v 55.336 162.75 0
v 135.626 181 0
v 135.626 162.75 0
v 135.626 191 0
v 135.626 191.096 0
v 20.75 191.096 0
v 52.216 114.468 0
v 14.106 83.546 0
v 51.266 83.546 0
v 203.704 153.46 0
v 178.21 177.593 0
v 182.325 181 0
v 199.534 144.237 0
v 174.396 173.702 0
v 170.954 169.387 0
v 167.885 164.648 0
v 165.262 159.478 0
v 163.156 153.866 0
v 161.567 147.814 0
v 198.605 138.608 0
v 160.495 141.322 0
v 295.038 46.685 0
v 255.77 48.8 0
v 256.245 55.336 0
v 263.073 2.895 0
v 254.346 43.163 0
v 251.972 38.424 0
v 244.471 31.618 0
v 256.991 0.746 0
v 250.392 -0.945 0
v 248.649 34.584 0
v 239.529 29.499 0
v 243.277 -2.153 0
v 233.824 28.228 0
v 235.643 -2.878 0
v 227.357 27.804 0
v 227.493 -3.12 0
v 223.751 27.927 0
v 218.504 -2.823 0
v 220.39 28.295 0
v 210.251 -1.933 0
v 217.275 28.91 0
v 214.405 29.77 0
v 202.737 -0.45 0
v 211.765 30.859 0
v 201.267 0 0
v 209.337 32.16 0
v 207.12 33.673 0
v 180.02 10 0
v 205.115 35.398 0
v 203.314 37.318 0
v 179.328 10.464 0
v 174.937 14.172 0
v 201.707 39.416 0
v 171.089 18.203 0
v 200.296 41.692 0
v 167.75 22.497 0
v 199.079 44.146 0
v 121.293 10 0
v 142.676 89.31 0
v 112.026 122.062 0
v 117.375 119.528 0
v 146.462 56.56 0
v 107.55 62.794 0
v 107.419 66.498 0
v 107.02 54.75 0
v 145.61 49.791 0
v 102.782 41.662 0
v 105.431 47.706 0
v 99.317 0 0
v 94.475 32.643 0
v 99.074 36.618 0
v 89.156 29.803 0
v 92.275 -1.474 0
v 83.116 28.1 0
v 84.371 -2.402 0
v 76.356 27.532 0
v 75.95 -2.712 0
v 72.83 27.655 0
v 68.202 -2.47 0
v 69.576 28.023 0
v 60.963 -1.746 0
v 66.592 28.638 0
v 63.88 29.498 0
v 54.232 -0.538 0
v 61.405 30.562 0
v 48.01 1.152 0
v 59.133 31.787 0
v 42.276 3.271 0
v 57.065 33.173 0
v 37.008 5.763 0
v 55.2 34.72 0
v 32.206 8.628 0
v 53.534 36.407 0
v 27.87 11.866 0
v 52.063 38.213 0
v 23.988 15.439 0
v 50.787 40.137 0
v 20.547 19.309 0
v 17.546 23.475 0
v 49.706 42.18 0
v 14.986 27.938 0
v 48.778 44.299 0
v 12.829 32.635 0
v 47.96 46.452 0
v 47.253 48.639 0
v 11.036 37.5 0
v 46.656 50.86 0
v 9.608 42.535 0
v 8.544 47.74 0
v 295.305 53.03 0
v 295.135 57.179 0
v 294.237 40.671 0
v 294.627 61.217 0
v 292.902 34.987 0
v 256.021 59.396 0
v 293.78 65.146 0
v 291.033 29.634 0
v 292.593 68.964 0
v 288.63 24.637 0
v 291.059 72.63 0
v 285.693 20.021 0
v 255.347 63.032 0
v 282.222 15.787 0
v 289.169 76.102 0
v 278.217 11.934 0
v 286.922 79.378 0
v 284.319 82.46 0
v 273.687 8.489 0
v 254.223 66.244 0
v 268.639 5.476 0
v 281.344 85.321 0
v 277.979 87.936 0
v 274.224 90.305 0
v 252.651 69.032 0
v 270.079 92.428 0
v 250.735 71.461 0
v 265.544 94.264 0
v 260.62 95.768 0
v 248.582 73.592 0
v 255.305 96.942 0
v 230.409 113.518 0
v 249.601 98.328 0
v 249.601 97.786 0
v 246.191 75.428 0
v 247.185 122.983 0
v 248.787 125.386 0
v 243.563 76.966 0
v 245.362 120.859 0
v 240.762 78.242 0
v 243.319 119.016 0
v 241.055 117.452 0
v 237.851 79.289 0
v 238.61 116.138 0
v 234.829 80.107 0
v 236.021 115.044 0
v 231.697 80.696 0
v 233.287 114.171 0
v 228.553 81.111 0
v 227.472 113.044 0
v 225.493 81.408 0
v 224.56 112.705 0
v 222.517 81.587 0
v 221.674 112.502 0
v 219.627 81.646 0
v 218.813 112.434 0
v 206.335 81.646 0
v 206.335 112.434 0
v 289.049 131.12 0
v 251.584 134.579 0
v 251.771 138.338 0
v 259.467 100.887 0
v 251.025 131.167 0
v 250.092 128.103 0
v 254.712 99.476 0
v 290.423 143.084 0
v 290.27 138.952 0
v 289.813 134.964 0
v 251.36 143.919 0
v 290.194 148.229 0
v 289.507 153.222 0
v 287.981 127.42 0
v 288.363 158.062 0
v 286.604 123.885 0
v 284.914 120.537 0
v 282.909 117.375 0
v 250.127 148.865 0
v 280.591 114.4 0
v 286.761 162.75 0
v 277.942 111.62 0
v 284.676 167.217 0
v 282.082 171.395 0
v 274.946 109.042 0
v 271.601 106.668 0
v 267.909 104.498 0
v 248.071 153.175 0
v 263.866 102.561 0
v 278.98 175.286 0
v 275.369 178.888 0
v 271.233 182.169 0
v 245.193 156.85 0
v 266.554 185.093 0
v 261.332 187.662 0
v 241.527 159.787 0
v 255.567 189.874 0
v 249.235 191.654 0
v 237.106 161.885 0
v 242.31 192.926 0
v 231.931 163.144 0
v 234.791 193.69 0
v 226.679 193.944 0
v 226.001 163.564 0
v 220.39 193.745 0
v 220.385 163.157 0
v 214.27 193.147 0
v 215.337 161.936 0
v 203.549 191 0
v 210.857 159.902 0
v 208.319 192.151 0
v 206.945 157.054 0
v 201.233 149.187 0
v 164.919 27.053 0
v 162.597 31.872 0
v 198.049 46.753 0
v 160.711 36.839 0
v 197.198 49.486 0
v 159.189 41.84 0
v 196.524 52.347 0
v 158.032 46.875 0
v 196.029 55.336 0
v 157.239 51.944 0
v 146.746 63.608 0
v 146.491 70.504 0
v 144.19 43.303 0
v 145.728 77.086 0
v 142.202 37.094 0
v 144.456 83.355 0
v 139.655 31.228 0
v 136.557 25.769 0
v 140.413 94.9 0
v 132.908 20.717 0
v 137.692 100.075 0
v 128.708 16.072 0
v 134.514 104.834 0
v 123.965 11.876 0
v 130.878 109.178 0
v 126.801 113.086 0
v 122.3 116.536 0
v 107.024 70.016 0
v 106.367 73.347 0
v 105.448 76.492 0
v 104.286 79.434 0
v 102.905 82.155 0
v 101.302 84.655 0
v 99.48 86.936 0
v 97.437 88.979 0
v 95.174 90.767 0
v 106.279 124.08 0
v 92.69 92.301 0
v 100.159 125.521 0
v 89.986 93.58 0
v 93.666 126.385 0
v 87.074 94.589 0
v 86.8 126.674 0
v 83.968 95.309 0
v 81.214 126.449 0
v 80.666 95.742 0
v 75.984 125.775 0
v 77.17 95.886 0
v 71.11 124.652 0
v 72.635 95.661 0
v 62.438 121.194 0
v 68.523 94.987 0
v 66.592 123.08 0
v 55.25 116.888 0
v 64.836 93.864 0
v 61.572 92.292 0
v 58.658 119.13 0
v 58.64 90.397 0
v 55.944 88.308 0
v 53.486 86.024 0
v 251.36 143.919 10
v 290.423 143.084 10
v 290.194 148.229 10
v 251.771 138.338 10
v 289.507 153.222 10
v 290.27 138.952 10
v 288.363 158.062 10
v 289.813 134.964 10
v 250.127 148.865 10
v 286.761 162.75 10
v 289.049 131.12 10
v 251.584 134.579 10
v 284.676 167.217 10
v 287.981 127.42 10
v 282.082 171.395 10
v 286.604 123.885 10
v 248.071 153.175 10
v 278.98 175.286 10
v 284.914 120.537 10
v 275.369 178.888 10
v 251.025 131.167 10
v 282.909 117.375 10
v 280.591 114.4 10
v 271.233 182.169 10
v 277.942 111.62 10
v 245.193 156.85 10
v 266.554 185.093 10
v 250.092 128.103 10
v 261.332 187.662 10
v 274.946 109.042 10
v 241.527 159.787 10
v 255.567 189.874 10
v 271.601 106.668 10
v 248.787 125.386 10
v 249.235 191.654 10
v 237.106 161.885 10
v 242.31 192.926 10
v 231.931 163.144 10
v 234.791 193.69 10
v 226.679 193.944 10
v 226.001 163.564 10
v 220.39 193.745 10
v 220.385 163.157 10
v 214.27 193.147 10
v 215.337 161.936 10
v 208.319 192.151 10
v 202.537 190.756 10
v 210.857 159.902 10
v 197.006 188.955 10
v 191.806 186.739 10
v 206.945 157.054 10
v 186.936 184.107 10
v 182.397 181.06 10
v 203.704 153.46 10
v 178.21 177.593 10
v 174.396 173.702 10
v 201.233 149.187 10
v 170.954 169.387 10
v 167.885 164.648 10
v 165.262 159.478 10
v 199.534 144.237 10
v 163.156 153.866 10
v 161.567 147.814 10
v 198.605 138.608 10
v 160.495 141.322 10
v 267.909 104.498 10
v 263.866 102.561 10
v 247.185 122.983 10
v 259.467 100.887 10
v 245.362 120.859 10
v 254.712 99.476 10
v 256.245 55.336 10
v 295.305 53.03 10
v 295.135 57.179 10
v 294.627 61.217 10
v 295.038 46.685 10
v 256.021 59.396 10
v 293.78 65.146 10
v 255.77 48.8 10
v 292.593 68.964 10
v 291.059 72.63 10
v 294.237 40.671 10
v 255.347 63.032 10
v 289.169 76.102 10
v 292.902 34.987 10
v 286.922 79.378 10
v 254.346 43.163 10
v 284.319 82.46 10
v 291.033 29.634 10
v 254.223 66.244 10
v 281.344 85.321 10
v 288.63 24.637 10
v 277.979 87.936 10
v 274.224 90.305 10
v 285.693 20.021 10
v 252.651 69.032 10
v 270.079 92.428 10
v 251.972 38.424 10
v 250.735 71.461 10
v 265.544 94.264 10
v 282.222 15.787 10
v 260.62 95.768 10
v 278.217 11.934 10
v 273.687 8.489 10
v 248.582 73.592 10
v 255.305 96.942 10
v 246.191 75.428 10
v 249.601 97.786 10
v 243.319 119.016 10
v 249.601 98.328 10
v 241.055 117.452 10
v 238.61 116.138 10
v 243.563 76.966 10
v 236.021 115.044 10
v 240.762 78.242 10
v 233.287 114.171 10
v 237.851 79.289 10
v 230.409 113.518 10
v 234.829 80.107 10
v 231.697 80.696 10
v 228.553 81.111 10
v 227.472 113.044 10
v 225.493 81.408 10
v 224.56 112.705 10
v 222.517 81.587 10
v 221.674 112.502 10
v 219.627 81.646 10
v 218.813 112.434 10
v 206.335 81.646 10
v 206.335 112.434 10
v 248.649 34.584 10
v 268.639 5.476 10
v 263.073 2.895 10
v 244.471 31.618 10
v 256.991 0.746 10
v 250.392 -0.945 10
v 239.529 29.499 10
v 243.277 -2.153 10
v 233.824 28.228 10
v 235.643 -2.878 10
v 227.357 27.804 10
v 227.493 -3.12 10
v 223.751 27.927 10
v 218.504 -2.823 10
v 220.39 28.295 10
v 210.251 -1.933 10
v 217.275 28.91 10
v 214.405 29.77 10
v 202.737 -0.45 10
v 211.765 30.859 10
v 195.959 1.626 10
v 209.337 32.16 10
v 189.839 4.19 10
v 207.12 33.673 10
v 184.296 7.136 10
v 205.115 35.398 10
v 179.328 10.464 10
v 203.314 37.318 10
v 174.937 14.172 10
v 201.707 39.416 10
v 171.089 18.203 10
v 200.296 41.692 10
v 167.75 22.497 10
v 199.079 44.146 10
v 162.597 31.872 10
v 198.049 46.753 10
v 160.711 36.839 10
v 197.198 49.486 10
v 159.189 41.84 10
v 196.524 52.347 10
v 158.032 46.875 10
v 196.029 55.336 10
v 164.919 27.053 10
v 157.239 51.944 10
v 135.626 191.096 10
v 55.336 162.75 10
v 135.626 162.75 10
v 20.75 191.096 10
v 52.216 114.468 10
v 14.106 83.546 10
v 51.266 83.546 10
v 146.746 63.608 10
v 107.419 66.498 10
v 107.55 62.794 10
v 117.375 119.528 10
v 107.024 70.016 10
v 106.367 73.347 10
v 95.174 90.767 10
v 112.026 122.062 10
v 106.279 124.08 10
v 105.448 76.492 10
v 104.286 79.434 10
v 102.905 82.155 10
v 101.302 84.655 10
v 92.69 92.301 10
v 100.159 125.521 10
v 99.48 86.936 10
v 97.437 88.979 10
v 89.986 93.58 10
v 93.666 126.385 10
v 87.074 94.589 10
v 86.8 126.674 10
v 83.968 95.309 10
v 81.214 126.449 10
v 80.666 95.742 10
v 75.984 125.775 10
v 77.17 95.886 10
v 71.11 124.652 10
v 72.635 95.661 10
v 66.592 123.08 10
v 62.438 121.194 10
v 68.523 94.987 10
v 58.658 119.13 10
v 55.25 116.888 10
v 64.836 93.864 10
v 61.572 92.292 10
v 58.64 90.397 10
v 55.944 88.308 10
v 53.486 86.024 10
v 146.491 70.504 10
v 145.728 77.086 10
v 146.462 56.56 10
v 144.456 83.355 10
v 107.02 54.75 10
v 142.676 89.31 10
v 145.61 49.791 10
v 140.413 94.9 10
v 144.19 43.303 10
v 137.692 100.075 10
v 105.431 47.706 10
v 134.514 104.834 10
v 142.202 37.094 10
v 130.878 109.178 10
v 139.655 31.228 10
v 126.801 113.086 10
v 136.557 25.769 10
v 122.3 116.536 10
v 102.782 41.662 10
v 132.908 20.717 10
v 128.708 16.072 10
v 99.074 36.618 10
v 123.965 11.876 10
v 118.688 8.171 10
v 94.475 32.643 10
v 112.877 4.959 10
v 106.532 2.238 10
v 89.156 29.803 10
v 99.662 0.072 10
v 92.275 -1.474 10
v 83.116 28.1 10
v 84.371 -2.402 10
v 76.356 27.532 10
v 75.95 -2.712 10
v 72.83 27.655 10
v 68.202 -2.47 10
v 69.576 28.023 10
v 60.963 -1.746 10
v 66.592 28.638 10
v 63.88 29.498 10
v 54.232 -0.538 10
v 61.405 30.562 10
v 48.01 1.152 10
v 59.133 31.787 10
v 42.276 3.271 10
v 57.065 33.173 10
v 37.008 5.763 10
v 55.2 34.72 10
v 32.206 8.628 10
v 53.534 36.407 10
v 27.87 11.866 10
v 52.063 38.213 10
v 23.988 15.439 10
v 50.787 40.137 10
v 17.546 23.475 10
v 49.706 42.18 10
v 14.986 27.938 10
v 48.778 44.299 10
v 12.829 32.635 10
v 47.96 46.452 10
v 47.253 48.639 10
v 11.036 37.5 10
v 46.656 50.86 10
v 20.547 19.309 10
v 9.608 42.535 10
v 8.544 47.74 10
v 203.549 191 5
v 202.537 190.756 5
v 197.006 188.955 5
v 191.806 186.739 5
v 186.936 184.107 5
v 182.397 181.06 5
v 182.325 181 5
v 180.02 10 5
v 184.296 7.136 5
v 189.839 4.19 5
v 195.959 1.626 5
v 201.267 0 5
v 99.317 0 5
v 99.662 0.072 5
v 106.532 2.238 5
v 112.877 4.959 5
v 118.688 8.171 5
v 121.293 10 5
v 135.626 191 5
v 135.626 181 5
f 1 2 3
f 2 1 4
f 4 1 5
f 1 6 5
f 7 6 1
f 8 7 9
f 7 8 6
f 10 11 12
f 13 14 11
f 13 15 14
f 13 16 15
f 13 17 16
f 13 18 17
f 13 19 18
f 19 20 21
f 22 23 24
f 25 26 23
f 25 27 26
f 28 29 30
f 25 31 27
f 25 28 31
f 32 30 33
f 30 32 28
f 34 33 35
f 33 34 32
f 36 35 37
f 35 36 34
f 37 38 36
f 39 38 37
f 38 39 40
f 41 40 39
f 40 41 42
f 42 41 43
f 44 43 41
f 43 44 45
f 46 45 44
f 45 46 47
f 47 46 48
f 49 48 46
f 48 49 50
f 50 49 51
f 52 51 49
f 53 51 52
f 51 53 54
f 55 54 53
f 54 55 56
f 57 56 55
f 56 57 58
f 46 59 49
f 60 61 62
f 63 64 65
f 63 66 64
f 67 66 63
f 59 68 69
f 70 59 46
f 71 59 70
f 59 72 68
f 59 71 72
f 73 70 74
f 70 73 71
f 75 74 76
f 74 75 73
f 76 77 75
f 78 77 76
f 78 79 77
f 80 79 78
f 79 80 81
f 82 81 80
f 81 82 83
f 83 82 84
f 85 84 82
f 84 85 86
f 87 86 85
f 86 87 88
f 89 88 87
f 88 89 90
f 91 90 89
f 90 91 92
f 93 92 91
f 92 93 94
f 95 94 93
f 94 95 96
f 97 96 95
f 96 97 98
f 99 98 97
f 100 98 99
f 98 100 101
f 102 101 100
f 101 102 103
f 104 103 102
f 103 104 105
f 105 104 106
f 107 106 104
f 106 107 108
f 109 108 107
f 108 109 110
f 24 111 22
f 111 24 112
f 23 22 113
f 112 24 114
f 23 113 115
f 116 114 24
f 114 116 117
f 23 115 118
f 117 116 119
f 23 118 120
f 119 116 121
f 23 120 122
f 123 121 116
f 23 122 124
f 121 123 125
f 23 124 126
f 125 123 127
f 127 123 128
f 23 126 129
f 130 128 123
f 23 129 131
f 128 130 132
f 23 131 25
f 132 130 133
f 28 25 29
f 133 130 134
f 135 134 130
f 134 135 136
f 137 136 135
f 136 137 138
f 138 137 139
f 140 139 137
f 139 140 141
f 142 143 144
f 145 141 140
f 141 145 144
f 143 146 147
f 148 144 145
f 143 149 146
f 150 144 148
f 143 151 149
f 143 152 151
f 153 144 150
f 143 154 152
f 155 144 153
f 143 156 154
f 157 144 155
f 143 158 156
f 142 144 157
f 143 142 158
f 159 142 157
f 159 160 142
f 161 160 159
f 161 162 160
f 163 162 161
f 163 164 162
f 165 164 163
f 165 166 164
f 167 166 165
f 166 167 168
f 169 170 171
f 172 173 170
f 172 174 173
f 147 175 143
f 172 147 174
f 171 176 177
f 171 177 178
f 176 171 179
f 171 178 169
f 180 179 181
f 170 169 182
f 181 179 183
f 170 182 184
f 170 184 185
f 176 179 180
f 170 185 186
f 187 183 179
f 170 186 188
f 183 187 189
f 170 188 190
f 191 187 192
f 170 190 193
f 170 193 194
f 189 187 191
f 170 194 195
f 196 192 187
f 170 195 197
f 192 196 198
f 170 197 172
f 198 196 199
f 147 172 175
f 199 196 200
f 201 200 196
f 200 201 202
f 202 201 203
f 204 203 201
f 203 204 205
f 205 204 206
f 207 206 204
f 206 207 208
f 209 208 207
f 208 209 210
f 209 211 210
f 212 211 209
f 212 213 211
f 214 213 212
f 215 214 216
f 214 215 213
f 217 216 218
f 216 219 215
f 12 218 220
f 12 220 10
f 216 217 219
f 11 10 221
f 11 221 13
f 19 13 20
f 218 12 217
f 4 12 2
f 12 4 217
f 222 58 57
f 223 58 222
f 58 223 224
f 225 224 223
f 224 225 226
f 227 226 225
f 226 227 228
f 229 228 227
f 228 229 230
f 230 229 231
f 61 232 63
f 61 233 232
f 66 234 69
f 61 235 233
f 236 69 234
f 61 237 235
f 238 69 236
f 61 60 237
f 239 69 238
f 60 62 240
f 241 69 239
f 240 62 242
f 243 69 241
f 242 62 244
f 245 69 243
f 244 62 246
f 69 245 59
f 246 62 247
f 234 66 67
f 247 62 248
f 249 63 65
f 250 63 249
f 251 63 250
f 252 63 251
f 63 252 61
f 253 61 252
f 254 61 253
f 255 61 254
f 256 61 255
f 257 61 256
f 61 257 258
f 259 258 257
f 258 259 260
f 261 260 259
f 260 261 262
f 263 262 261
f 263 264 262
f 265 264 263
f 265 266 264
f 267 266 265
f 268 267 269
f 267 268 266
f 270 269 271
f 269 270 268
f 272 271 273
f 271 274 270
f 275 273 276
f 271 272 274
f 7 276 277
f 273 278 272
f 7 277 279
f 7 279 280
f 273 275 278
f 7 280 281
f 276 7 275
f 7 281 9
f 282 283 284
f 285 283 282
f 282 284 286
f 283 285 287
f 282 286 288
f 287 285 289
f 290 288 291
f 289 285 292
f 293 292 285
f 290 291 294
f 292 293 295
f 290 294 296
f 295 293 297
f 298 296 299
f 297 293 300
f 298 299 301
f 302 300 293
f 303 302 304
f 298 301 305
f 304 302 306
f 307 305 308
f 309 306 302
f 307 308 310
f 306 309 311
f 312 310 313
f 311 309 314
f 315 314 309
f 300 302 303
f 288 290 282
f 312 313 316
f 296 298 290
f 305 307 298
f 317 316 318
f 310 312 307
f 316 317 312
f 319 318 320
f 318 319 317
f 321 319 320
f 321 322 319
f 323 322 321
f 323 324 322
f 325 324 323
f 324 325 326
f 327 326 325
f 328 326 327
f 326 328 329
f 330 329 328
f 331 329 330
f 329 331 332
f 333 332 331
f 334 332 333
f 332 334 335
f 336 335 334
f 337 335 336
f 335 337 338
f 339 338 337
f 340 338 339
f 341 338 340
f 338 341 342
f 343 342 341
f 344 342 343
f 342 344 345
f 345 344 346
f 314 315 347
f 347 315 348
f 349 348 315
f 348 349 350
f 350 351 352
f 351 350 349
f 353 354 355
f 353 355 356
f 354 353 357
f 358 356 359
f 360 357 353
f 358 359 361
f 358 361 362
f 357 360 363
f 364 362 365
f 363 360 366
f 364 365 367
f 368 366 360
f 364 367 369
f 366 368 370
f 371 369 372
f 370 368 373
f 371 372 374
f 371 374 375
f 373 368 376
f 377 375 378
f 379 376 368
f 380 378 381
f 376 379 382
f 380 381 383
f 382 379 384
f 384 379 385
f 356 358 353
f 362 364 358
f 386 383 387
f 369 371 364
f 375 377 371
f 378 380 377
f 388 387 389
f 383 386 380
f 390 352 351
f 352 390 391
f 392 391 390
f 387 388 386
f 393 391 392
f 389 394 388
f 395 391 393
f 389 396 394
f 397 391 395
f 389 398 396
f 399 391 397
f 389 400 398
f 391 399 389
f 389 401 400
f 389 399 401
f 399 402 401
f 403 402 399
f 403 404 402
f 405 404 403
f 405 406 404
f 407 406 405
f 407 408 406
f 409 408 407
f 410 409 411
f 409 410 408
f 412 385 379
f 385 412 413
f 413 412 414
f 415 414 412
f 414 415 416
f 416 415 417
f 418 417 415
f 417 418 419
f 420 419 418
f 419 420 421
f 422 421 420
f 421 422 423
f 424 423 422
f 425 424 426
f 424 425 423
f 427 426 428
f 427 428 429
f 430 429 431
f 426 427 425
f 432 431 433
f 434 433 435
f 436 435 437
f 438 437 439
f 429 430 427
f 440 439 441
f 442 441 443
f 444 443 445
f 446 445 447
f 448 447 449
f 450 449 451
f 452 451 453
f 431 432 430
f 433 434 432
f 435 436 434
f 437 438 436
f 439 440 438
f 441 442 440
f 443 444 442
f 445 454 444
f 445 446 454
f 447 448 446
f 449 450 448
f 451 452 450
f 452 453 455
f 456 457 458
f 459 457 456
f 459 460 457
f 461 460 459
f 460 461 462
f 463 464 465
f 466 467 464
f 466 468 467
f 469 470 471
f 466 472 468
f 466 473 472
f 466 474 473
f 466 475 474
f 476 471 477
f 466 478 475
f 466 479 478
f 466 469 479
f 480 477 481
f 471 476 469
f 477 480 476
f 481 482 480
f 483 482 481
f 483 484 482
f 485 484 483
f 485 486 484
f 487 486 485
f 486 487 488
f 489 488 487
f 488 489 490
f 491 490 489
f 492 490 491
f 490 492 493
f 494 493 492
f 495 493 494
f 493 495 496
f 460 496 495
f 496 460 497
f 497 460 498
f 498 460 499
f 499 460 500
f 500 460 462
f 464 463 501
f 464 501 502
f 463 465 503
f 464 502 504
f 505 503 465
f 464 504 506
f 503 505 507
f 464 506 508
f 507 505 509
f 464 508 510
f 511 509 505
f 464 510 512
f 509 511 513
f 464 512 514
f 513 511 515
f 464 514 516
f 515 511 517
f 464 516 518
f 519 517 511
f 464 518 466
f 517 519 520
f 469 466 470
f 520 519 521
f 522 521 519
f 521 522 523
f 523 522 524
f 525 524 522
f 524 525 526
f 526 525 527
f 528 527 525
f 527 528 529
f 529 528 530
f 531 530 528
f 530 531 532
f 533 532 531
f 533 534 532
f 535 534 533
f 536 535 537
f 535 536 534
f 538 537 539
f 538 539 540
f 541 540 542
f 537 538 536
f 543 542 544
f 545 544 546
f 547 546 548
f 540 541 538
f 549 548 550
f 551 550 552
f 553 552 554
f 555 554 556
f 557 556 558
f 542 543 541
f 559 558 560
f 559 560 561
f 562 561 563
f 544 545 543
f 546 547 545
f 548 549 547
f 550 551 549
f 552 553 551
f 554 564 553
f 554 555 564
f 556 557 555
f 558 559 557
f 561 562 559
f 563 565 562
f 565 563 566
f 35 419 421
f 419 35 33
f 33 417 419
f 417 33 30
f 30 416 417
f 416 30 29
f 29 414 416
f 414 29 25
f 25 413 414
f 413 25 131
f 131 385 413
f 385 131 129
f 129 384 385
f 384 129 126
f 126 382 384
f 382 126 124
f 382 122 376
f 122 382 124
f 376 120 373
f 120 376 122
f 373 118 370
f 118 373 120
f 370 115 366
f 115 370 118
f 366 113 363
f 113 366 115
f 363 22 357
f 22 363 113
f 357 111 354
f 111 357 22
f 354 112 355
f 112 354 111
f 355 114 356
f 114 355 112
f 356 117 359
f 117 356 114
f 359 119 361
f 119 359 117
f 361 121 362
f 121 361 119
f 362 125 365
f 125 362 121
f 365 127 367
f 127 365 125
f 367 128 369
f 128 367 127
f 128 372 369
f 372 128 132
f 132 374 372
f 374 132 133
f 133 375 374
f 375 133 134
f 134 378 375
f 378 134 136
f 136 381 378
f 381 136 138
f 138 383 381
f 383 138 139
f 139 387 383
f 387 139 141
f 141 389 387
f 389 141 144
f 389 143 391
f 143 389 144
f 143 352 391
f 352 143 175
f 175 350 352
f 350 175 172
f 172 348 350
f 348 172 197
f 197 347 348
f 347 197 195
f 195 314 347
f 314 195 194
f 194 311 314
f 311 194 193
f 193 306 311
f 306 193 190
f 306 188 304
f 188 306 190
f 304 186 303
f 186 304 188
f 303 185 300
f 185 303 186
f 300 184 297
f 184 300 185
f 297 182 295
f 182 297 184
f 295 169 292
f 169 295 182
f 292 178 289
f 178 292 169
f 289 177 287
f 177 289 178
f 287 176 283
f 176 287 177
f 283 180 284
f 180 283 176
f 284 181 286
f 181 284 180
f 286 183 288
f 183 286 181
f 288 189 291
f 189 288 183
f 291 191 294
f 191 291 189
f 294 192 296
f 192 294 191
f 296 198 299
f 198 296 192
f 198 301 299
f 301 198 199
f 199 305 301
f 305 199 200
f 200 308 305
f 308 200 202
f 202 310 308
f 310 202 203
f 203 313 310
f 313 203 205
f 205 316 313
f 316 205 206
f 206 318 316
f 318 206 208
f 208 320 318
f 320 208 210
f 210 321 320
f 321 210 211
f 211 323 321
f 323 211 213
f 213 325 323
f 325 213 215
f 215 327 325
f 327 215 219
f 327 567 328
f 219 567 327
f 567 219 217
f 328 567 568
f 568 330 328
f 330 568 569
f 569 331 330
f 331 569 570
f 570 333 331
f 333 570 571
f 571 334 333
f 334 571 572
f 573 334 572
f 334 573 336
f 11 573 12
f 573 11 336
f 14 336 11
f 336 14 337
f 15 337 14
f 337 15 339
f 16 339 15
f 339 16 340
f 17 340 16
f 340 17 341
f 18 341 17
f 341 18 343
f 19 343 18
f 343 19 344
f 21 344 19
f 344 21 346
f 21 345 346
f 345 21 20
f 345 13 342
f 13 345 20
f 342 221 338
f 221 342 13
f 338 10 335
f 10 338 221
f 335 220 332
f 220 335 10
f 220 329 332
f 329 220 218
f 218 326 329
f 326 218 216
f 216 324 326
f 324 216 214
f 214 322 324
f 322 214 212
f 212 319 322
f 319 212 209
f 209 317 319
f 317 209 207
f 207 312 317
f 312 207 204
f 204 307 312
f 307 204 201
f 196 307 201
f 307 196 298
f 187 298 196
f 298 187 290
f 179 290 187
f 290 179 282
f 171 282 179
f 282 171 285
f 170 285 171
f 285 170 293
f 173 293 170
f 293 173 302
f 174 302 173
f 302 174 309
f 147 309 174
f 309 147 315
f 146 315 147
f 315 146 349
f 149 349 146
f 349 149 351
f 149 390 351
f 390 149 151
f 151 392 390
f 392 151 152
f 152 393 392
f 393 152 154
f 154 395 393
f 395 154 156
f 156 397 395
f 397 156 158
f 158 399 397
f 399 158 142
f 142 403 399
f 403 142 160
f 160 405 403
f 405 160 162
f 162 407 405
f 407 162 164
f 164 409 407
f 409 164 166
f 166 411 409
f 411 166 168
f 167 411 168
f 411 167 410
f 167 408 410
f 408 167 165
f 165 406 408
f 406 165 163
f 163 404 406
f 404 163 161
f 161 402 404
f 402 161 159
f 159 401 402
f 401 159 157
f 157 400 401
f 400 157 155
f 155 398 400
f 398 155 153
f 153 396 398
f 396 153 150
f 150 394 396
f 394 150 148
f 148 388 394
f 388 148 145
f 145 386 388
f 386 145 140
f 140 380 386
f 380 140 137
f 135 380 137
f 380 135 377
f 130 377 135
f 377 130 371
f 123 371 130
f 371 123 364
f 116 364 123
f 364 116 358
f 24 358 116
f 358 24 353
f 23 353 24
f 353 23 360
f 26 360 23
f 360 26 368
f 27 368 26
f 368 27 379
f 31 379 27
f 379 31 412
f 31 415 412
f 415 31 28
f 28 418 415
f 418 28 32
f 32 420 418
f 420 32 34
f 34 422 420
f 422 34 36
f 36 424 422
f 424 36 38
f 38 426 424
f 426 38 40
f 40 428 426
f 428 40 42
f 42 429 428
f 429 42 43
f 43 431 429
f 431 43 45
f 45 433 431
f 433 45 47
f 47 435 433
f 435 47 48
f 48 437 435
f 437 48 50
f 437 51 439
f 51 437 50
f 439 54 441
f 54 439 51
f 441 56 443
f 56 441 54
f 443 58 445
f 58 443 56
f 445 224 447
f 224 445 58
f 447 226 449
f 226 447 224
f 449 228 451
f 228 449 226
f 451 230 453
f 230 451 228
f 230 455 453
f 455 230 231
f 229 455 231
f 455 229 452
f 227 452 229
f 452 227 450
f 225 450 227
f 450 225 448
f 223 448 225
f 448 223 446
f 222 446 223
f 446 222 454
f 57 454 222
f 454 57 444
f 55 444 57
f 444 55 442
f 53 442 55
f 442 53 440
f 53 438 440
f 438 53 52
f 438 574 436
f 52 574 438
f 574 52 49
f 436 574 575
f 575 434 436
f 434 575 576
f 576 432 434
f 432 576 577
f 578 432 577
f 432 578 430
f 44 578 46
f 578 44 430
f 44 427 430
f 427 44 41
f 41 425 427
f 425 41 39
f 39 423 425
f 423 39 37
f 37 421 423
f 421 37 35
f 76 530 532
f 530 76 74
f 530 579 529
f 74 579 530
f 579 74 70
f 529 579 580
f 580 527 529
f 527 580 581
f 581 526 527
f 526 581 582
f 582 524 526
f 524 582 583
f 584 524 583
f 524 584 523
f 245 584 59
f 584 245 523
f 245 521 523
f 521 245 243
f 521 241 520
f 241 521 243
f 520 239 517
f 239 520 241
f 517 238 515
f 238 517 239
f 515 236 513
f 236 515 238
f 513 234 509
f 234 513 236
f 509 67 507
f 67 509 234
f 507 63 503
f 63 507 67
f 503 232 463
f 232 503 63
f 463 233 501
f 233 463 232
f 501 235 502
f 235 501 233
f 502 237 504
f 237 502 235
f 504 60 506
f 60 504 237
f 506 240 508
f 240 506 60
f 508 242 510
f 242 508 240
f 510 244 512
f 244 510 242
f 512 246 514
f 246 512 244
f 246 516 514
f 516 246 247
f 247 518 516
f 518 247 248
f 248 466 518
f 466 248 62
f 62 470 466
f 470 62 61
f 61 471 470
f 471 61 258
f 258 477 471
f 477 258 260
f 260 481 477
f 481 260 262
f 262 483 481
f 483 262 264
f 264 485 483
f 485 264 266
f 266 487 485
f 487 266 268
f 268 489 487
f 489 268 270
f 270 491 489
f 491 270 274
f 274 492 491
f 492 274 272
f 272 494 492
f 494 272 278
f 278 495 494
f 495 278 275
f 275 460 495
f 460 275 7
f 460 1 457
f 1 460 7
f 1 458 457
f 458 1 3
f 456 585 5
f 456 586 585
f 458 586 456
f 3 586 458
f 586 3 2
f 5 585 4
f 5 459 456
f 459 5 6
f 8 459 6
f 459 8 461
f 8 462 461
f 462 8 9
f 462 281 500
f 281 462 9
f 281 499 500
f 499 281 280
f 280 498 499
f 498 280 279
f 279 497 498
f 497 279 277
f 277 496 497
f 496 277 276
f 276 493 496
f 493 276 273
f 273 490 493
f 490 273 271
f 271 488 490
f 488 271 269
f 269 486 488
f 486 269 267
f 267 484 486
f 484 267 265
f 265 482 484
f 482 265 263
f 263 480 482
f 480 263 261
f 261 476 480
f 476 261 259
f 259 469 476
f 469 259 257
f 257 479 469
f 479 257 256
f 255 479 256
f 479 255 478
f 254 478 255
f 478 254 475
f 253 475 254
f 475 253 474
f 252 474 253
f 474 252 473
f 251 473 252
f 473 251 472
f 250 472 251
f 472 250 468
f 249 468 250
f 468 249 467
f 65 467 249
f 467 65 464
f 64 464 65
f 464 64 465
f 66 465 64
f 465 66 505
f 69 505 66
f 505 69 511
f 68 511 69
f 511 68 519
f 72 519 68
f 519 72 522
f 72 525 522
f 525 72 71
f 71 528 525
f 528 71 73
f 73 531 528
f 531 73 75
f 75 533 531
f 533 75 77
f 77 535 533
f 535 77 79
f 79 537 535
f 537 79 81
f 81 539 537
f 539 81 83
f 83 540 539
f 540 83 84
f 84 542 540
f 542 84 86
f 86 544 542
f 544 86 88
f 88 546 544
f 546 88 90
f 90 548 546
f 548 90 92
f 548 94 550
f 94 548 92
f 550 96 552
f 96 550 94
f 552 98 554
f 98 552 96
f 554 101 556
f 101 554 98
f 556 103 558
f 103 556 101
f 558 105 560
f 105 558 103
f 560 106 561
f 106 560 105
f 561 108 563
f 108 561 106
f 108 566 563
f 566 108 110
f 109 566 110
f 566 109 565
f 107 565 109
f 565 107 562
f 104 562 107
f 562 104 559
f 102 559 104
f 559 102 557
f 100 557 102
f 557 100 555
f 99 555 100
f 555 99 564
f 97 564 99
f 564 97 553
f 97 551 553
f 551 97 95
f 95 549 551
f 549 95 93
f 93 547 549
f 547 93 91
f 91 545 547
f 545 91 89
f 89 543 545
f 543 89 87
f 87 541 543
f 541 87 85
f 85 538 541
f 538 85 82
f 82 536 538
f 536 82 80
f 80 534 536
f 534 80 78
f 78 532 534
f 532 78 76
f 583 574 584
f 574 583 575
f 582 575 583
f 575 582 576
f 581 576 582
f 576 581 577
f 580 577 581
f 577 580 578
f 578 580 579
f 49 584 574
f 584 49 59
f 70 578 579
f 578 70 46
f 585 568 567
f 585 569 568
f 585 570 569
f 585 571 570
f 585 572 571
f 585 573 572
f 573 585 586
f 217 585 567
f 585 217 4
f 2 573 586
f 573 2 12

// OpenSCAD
linear_extrude(height = 10)
scale([20.0,20.0,20.0])
{
    text("53", font = "Liberation Sans:style=Bold");
}


translate([80,0,0])
cube([130,10,5]);

translate([80,181,0])
cube([130,10,5]);
